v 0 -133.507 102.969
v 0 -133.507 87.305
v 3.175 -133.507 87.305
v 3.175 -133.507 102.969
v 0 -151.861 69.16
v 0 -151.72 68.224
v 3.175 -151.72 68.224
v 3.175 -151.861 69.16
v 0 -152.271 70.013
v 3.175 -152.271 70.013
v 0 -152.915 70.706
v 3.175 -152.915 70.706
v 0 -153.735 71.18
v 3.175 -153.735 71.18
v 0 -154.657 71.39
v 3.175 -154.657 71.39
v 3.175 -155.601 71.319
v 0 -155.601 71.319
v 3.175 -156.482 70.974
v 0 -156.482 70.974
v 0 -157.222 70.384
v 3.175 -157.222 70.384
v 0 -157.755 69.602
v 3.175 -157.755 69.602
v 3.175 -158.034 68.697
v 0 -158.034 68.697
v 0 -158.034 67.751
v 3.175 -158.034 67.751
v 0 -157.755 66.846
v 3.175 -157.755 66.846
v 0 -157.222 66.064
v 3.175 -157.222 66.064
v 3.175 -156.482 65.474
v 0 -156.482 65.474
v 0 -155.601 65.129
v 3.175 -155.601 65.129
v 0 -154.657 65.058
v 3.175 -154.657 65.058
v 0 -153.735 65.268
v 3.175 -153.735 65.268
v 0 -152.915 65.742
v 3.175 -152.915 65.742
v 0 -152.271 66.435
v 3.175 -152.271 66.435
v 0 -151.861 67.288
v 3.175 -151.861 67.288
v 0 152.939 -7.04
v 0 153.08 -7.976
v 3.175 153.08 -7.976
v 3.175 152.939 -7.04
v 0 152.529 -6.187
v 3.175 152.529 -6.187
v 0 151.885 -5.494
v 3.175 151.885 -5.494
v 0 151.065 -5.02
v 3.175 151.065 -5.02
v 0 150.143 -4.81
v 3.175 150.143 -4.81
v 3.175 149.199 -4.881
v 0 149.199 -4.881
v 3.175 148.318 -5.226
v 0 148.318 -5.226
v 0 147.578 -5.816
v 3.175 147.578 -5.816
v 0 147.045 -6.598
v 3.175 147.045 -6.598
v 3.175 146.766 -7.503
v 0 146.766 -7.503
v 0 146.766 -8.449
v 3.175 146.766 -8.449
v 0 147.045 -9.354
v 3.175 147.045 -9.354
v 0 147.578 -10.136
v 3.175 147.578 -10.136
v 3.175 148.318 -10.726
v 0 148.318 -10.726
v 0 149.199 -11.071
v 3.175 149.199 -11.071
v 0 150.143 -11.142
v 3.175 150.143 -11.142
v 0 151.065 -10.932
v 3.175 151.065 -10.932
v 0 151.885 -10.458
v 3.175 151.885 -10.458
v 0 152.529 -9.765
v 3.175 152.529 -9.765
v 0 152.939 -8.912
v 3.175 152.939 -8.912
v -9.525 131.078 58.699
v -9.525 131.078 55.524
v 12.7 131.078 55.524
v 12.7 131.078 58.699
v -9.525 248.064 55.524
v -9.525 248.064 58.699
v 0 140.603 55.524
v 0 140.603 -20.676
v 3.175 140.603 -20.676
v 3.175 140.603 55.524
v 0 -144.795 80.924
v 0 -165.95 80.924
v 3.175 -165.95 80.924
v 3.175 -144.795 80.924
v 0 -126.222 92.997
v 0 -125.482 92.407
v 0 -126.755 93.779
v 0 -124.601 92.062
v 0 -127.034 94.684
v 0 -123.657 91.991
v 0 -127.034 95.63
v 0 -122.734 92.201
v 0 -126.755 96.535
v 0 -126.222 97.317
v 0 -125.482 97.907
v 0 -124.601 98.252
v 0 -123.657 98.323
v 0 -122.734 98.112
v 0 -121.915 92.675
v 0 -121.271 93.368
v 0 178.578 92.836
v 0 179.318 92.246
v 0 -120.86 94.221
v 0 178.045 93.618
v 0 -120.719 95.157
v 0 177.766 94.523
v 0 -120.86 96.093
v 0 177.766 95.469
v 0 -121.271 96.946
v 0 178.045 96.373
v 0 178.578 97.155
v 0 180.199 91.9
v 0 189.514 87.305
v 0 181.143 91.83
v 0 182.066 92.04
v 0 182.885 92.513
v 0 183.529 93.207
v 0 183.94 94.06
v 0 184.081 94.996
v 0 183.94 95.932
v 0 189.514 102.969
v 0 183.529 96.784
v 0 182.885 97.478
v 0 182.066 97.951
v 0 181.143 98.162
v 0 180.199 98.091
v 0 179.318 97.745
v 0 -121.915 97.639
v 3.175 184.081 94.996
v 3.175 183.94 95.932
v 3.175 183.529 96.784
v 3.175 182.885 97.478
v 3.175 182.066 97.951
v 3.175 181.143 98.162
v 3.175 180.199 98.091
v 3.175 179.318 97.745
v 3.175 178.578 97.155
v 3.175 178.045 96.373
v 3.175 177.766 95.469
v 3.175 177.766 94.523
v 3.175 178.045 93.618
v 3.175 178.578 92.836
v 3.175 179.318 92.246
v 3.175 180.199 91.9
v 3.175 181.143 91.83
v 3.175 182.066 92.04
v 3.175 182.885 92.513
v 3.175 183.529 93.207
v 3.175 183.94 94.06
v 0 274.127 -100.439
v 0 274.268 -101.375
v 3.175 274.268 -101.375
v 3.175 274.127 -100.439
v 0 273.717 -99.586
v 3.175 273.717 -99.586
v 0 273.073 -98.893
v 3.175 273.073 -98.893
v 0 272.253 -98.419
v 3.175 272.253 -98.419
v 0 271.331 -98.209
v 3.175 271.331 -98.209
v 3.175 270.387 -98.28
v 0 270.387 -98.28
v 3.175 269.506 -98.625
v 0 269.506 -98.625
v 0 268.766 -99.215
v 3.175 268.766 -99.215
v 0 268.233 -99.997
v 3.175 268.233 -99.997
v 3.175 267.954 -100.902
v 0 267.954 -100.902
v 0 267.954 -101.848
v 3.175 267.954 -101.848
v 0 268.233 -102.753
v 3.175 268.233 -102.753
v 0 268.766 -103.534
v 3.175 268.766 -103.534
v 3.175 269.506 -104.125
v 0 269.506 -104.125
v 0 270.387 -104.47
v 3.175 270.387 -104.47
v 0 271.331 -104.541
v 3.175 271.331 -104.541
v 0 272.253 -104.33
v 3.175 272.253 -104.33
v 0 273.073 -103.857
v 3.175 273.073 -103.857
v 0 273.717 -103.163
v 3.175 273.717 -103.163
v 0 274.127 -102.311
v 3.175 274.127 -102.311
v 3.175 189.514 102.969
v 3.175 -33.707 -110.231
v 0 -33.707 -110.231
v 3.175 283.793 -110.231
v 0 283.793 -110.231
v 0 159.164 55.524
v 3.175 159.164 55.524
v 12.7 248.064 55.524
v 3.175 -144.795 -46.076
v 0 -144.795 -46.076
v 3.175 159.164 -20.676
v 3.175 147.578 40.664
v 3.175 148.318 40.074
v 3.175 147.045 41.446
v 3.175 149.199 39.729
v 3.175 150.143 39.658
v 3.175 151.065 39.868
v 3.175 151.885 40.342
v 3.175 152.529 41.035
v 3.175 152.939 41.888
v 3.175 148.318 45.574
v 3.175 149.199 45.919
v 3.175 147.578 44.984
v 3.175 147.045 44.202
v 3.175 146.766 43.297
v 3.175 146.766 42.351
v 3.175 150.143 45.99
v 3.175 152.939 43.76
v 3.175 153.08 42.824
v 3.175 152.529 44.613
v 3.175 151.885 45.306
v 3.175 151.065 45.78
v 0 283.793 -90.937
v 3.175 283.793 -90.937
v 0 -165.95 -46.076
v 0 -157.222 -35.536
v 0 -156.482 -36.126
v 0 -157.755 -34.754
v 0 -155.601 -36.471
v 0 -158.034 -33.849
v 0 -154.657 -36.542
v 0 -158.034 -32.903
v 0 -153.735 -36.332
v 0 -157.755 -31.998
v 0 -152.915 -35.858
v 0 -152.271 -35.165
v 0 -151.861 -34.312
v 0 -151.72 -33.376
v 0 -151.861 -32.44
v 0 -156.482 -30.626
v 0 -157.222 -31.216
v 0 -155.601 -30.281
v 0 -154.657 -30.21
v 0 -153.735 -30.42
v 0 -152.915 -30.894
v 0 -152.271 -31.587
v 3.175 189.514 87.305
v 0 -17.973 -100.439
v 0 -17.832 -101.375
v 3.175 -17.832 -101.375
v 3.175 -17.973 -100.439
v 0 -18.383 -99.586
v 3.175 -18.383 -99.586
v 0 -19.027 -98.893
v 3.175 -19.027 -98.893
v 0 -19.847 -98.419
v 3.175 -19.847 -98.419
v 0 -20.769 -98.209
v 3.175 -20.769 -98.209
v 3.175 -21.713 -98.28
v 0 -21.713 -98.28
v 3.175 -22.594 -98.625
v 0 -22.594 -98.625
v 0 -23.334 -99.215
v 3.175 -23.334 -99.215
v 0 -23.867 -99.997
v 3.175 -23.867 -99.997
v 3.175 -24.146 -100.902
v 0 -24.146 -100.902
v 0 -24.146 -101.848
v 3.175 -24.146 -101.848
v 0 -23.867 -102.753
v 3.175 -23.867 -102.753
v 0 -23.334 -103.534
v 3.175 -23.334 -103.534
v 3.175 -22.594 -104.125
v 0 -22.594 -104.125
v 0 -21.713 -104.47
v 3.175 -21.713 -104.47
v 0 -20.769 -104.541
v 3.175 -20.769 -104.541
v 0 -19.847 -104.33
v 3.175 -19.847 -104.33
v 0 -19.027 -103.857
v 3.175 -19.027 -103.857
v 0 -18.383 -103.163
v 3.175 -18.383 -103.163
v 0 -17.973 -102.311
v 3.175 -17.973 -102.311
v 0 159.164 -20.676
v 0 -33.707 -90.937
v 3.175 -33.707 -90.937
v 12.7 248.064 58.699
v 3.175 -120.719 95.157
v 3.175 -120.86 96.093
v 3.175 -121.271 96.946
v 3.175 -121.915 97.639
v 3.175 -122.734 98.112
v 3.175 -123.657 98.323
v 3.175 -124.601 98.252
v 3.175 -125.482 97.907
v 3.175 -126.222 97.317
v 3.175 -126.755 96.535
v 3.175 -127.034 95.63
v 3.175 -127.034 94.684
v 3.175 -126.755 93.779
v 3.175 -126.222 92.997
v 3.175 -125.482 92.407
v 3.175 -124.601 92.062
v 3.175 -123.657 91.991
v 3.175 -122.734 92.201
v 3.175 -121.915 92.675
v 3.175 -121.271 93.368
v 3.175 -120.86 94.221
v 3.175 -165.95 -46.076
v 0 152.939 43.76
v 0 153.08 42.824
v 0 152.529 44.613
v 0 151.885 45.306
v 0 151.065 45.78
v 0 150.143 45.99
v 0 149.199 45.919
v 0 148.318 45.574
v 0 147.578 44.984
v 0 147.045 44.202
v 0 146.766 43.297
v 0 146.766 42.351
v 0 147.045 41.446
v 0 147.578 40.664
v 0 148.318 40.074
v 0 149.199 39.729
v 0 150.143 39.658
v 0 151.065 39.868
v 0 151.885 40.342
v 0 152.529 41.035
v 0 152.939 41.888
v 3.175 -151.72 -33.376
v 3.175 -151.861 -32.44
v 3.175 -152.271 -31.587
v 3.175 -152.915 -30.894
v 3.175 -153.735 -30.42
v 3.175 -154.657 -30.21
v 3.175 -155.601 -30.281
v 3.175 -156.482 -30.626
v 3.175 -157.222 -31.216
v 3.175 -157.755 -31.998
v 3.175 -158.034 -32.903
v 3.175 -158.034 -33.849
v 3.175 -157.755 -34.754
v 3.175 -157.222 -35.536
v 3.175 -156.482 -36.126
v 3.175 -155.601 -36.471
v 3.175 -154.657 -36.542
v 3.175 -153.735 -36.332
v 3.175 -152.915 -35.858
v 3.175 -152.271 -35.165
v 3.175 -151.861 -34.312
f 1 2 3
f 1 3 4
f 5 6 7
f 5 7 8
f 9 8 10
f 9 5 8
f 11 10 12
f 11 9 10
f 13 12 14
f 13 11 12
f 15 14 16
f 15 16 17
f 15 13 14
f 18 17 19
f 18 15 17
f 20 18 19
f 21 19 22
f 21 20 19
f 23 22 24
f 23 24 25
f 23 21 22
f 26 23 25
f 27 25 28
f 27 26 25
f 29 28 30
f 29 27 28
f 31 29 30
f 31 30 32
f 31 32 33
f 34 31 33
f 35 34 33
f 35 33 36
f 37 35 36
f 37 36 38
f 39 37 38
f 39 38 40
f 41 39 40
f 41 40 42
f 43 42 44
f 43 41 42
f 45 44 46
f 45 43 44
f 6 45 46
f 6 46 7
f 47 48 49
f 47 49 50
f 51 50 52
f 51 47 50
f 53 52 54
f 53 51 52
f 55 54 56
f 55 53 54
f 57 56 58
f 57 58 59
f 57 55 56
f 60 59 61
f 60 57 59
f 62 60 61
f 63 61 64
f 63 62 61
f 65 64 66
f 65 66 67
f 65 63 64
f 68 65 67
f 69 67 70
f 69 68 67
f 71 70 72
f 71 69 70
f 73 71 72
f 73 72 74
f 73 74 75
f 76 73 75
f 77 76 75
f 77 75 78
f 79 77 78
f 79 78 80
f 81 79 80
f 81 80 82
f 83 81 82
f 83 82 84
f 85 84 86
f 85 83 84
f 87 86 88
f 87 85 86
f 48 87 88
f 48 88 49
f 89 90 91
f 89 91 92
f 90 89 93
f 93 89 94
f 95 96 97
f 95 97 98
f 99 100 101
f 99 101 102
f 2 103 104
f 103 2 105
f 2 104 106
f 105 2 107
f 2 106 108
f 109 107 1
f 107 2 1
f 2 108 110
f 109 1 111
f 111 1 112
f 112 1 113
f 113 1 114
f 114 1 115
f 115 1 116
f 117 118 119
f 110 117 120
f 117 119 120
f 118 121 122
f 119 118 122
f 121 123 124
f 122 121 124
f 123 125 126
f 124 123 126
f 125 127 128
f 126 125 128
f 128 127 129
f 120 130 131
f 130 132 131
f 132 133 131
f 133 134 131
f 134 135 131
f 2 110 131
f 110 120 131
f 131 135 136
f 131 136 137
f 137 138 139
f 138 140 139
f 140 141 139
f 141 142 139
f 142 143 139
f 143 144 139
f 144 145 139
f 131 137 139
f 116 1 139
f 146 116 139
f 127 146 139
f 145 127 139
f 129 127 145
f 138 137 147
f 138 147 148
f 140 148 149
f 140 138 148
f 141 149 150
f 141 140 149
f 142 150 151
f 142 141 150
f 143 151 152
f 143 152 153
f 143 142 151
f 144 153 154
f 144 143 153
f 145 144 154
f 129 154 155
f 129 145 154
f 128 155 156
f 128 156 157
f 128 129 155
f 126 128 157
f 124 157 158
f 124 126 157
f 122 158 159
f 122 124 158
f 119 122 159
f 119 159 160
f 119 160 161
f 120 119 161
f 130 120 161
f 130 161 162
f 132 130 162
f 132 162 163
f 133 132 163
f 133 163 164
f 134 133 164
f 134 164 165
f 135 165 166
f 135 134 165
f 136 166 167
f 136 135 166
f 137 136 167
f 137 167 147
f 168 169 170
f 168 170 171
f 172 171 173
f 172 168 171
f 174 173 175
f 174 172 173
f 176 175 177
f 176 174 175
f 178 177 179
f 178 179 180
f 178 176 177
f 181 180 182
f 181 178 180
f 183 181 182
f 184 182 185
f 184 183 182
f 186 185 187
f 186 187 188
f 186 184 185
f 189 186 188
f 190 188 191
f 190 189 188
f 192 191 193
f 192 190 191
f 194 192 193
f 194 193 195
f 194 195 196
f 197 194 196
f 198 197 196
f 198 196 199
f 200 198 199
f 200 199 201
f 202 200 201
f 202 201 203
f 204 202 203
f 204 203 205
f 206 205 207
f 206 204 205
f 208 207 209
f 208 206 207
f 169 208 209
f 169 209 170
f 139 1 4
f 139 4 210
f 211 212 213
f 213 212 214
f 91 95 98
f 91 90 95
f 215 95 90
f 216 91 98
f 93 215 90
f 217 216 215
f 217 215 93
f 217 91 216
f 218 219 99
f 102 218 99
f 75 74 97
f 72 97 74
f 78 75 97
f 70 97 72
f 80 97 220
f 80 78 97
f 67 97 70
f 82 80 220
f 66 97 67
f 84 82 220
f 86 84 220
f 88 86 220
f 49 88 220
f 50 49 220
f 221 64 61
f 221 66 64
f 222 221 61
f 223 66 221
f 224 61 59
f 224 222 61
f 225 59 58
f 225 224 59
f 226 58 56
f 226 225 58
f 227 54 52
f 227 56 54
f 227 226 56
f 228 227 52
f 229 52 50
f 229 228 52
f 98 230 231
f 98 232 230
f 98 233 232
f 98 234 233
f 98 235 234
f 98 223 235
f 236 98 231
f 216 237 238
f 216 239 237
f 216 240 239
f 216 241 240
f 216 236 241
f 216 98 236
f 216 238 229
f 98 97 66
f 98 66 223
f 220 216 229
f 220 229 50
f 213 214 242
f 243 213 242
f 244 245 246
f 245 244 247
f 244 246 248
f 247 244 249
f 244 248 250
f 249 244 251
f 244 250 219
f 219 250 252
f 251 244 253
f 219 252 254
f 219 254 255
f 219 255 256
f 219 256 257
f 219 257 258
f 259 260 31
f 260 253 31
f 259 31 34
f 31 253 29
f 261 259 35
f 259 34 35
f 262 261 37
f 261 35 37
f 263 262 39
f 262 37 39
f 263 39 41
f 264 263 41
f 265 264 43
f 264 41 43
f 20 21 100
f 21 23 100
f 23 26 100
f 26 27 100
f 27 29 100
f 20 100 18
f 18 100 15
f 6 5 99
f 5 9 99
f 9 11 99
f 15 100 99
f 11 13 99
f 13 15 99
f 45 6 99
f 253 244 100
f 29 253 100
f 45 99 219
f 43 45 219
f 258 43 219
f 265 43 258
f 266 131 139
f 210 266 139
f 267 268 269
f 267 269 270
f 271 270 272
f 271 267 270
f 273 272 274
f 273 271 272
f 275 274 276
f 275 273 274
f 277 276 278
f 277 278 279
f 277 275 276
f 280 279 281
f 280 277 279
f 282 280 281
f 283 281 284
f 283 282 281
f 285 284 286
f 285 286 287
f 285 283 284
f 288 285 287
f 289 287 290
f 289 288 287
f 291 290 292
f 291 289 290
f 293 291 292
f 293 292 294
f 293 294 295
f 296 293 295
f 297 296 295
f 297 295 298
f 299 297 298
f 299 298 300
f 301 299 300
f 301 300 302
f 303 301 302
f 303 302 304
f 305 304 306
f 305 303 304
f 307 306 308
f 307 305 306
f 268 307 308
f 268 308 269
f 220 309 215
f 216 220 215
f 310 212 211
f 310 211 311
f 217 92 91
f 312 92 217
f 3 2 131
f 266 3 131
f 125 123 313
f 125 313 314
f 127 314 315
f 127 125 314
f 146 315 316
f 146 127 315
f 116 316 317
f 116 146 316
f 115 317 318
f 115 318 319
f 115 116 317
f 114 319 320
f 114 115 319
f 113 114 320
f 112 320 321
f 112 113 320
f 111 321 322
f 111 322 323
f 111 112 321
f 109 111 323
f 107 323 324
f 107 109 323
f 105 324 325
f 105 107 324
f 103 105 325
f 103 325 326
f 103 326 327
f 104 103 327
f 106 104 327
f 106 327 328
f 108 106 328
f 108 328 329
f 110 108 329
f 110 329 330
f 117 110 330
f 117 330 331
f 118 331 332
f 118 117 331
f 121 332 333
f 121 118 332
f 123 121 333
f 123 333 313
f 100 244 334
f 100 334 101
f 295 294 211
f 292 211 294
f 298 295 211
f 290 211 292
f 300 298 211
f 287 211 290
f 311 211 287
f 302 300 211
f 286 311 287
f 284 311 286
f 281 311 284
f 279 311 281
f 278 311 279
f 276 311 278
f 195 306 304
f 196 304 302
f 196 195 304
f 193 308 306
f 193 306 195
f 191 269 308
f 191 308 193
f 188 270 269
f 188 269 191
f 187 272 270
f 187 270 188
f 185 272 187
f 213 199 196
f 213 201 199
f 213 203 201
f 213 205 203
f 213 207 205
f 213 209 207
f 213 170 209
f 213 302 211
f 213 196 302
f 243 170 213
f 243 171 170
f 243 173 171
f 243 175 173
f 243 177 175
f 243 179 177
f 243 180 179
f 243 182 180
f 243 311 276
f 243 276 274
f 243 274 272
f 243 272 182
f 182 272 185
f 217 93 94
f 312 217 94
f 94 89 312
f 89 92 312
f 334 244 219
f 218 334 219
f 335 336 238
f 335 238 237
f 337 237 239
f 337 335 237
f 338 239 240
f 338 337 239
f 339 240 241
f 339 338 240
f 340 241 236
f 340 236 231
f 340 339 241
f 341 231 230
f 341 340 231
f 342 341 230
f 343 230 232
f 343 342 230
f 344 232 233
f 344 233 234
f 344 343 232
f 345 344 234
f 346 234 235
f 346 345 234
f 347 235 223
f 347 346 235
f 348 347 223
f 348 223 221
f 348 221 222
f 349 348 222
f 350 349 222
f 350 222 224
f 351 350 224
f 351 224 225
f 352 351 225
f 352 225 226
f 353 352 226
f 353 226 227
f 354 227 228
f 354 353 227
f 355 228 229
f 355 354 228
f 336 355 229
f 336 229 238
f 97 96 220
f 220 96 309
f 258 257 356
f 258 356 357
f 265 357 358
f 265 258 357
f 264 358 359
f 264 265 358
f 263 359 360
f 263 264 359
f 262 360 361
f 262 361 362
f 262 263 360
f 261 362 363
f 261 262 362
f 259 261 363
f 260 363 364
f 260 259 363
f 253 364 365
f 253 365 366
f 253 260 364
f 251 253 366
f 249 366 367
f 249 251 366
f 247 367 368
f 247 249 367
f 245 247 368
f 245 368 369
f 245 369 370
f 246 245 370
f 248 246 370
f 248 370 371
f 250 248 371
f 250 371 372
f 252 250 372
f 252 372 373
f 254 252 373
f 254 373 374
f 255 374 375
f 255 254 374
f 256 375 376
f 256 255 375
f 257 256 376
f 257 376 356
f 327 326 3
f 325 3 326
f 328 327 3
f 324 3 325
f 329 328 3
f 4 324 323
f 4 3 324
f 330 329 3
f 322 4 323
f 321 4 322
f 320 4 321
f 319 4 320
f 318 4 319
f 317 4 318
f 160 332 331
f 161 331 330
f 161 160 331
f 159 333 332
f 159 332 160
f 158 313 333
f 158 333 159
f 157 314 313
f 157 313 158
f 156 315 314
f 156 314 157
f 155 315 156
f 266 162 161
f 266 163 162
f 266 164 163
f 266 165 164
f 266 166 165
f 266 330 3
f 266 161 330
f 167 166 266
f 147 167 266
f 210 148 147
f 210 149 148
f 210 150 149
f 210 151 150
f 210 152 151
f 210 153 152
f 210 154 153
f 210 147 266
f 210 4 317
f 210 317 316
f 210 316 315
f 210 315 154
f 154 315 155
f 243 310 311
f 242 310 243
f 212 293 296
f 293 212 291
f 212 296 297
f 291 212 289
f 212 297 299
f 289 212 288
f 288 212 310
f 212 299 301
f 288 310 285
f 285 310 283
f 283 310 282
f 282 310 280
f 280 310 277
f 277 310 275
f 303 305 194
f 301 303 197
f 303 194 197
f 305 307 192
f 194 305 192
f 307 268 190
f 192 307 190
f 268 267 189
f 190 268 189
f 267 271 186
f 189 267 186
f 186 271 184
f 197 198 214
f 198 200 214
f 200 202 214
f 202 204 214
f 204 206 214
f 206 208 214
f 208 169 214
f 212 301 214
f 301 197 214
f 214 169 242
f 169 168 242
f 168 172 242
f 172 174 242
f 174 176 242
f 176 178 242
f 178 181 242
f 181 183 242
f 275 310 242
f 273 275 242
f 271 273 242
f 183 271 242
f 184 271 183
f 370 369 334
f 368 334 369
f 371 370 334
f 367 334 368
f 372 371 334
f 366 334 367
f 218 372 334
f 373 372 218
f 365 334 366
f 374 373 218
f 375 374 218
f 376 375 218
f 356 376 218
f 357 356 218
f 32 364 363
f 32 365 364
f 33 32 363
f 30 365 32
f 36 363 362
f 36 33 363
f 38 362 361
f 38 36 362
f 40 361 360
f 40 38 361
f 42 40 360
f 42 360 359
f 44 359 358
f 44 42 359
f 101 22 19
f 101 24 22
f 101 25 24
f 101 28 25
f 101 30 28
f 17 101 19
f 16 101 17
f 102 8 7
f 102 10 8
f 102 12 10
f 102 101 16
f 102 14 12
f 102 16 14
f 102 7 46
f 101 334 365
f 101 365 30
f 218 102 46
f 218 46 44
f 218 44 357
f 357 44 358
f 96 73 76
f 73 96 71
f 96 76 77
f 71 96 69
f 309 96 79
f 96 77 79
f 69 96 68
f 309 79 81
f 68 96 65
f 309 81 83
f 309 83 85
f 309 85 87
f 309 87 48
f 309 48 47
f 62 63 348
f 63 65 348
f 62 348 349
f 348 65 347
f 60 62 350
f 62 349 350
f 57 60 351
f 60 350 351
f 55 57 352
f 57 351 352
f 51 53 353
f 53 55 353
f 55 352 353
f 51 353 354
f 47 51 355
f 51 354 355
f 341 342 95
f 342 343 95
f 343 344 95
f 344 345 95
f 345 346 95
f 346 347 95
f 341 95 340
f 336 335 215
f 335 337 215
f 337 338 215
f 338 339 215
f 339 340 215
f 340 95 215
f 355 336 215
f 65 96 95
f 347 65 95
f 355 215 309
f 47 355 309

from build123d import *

# Parameters (mm, degrees)
F0_W          = 21.155387
F0_H          = 127
F0_R          = 3.175
F0_W_2        = 18.560842
F0_H_2        = 76.2
F1_DEPTH      = 3.175
F2_W          = 323.020727
F2_H          = 15.664489
F2_R          = 3.175
F3_DEPTH      = 3.175
F4_W          = 317.5
F4_H          = 19.294449
F4_R          = 3.175
F5_DEPTH      = 3.175
F6_W          = 116.985842
F6_H          = 3.175
F7_DEPTH      = 9.525
F7_DEPTH_BACK = 12.7


with BuildPart() as f1:
    # F0 (on Right) → F1 (new body)
    with BuildSketch(Plane.YZ):
        with Locations((-155.372232, 17.423994)):
            Rectangle(F0_W, F0_H)
        with Locations((-154.894739, -33.376006)):
            Circle(F0_R, mode=Mode.SUBTRACT)
        with Locations((-154.894739, 68.223994)):
            Circle(F0_R, mode=Mode.SUBTRACT)
        with Locations((149.883799, 17.423994)):
            Rectangle(F0_W_2, F0_H_2)
        with Locations((149.905261, -7.976006)):
            Circle(F0_R, mode=Mode.SUBTRACT)
        with Locations((149.905261, 42.823994)):
            Circle(F0_R, mode=Mode.SUBTRACT)
    extrude(amount=F1_DEPTH)

    # F6 (on face) → F7 (join, two sides)
    with BuildSketch(Plane.YZ.offset(3.175)) as f7_sk:
        with Locations((189.571299, 57.111494)):
            Rectangle(F6_W, F6_H)
    extrude(amount=F7_DEPTH)
    extrude(f7_sk.sketch, amount=-F7_DEPTH_BACK)


with BuildPart() as f3:
    # F2 (on Right) → F3 (new body)
    with BuildSketch(Plane.YZ):
        with Locations((28.003409, 95.137007)):
            Rectangle(F2_W, F2_H)
        with Locations((180.905588, 94.99578)):
            Circle(F2_R, mode=Mode.SUBTRACT)
        with Locations((-123.894412, 95.156968)):
            Circle(F2_R, mode=Mode.SUBTRACT)
    extrude(amount=F3_DEPTH)


with BuildPart() as f5:
    # F4 (on Right) → F5 (new body)
    with BuildSketch(Plane.YZ):
        with Locations((125.043394, -100.584175)):
            Rectangle(F4_W, F4_H)
        with Locations((-21.006606, -101.374939)):
            Circle(F4_R, mode=Mode.SUBTRACT)
        with Locations((271.093394, -101.374939)):
            Circle(F4_R, mode=Mode.SUBTRACT)
    extrude(amount=F5_DEPTH)


solid = Compound([f1.part, f3.part, f5.part])
